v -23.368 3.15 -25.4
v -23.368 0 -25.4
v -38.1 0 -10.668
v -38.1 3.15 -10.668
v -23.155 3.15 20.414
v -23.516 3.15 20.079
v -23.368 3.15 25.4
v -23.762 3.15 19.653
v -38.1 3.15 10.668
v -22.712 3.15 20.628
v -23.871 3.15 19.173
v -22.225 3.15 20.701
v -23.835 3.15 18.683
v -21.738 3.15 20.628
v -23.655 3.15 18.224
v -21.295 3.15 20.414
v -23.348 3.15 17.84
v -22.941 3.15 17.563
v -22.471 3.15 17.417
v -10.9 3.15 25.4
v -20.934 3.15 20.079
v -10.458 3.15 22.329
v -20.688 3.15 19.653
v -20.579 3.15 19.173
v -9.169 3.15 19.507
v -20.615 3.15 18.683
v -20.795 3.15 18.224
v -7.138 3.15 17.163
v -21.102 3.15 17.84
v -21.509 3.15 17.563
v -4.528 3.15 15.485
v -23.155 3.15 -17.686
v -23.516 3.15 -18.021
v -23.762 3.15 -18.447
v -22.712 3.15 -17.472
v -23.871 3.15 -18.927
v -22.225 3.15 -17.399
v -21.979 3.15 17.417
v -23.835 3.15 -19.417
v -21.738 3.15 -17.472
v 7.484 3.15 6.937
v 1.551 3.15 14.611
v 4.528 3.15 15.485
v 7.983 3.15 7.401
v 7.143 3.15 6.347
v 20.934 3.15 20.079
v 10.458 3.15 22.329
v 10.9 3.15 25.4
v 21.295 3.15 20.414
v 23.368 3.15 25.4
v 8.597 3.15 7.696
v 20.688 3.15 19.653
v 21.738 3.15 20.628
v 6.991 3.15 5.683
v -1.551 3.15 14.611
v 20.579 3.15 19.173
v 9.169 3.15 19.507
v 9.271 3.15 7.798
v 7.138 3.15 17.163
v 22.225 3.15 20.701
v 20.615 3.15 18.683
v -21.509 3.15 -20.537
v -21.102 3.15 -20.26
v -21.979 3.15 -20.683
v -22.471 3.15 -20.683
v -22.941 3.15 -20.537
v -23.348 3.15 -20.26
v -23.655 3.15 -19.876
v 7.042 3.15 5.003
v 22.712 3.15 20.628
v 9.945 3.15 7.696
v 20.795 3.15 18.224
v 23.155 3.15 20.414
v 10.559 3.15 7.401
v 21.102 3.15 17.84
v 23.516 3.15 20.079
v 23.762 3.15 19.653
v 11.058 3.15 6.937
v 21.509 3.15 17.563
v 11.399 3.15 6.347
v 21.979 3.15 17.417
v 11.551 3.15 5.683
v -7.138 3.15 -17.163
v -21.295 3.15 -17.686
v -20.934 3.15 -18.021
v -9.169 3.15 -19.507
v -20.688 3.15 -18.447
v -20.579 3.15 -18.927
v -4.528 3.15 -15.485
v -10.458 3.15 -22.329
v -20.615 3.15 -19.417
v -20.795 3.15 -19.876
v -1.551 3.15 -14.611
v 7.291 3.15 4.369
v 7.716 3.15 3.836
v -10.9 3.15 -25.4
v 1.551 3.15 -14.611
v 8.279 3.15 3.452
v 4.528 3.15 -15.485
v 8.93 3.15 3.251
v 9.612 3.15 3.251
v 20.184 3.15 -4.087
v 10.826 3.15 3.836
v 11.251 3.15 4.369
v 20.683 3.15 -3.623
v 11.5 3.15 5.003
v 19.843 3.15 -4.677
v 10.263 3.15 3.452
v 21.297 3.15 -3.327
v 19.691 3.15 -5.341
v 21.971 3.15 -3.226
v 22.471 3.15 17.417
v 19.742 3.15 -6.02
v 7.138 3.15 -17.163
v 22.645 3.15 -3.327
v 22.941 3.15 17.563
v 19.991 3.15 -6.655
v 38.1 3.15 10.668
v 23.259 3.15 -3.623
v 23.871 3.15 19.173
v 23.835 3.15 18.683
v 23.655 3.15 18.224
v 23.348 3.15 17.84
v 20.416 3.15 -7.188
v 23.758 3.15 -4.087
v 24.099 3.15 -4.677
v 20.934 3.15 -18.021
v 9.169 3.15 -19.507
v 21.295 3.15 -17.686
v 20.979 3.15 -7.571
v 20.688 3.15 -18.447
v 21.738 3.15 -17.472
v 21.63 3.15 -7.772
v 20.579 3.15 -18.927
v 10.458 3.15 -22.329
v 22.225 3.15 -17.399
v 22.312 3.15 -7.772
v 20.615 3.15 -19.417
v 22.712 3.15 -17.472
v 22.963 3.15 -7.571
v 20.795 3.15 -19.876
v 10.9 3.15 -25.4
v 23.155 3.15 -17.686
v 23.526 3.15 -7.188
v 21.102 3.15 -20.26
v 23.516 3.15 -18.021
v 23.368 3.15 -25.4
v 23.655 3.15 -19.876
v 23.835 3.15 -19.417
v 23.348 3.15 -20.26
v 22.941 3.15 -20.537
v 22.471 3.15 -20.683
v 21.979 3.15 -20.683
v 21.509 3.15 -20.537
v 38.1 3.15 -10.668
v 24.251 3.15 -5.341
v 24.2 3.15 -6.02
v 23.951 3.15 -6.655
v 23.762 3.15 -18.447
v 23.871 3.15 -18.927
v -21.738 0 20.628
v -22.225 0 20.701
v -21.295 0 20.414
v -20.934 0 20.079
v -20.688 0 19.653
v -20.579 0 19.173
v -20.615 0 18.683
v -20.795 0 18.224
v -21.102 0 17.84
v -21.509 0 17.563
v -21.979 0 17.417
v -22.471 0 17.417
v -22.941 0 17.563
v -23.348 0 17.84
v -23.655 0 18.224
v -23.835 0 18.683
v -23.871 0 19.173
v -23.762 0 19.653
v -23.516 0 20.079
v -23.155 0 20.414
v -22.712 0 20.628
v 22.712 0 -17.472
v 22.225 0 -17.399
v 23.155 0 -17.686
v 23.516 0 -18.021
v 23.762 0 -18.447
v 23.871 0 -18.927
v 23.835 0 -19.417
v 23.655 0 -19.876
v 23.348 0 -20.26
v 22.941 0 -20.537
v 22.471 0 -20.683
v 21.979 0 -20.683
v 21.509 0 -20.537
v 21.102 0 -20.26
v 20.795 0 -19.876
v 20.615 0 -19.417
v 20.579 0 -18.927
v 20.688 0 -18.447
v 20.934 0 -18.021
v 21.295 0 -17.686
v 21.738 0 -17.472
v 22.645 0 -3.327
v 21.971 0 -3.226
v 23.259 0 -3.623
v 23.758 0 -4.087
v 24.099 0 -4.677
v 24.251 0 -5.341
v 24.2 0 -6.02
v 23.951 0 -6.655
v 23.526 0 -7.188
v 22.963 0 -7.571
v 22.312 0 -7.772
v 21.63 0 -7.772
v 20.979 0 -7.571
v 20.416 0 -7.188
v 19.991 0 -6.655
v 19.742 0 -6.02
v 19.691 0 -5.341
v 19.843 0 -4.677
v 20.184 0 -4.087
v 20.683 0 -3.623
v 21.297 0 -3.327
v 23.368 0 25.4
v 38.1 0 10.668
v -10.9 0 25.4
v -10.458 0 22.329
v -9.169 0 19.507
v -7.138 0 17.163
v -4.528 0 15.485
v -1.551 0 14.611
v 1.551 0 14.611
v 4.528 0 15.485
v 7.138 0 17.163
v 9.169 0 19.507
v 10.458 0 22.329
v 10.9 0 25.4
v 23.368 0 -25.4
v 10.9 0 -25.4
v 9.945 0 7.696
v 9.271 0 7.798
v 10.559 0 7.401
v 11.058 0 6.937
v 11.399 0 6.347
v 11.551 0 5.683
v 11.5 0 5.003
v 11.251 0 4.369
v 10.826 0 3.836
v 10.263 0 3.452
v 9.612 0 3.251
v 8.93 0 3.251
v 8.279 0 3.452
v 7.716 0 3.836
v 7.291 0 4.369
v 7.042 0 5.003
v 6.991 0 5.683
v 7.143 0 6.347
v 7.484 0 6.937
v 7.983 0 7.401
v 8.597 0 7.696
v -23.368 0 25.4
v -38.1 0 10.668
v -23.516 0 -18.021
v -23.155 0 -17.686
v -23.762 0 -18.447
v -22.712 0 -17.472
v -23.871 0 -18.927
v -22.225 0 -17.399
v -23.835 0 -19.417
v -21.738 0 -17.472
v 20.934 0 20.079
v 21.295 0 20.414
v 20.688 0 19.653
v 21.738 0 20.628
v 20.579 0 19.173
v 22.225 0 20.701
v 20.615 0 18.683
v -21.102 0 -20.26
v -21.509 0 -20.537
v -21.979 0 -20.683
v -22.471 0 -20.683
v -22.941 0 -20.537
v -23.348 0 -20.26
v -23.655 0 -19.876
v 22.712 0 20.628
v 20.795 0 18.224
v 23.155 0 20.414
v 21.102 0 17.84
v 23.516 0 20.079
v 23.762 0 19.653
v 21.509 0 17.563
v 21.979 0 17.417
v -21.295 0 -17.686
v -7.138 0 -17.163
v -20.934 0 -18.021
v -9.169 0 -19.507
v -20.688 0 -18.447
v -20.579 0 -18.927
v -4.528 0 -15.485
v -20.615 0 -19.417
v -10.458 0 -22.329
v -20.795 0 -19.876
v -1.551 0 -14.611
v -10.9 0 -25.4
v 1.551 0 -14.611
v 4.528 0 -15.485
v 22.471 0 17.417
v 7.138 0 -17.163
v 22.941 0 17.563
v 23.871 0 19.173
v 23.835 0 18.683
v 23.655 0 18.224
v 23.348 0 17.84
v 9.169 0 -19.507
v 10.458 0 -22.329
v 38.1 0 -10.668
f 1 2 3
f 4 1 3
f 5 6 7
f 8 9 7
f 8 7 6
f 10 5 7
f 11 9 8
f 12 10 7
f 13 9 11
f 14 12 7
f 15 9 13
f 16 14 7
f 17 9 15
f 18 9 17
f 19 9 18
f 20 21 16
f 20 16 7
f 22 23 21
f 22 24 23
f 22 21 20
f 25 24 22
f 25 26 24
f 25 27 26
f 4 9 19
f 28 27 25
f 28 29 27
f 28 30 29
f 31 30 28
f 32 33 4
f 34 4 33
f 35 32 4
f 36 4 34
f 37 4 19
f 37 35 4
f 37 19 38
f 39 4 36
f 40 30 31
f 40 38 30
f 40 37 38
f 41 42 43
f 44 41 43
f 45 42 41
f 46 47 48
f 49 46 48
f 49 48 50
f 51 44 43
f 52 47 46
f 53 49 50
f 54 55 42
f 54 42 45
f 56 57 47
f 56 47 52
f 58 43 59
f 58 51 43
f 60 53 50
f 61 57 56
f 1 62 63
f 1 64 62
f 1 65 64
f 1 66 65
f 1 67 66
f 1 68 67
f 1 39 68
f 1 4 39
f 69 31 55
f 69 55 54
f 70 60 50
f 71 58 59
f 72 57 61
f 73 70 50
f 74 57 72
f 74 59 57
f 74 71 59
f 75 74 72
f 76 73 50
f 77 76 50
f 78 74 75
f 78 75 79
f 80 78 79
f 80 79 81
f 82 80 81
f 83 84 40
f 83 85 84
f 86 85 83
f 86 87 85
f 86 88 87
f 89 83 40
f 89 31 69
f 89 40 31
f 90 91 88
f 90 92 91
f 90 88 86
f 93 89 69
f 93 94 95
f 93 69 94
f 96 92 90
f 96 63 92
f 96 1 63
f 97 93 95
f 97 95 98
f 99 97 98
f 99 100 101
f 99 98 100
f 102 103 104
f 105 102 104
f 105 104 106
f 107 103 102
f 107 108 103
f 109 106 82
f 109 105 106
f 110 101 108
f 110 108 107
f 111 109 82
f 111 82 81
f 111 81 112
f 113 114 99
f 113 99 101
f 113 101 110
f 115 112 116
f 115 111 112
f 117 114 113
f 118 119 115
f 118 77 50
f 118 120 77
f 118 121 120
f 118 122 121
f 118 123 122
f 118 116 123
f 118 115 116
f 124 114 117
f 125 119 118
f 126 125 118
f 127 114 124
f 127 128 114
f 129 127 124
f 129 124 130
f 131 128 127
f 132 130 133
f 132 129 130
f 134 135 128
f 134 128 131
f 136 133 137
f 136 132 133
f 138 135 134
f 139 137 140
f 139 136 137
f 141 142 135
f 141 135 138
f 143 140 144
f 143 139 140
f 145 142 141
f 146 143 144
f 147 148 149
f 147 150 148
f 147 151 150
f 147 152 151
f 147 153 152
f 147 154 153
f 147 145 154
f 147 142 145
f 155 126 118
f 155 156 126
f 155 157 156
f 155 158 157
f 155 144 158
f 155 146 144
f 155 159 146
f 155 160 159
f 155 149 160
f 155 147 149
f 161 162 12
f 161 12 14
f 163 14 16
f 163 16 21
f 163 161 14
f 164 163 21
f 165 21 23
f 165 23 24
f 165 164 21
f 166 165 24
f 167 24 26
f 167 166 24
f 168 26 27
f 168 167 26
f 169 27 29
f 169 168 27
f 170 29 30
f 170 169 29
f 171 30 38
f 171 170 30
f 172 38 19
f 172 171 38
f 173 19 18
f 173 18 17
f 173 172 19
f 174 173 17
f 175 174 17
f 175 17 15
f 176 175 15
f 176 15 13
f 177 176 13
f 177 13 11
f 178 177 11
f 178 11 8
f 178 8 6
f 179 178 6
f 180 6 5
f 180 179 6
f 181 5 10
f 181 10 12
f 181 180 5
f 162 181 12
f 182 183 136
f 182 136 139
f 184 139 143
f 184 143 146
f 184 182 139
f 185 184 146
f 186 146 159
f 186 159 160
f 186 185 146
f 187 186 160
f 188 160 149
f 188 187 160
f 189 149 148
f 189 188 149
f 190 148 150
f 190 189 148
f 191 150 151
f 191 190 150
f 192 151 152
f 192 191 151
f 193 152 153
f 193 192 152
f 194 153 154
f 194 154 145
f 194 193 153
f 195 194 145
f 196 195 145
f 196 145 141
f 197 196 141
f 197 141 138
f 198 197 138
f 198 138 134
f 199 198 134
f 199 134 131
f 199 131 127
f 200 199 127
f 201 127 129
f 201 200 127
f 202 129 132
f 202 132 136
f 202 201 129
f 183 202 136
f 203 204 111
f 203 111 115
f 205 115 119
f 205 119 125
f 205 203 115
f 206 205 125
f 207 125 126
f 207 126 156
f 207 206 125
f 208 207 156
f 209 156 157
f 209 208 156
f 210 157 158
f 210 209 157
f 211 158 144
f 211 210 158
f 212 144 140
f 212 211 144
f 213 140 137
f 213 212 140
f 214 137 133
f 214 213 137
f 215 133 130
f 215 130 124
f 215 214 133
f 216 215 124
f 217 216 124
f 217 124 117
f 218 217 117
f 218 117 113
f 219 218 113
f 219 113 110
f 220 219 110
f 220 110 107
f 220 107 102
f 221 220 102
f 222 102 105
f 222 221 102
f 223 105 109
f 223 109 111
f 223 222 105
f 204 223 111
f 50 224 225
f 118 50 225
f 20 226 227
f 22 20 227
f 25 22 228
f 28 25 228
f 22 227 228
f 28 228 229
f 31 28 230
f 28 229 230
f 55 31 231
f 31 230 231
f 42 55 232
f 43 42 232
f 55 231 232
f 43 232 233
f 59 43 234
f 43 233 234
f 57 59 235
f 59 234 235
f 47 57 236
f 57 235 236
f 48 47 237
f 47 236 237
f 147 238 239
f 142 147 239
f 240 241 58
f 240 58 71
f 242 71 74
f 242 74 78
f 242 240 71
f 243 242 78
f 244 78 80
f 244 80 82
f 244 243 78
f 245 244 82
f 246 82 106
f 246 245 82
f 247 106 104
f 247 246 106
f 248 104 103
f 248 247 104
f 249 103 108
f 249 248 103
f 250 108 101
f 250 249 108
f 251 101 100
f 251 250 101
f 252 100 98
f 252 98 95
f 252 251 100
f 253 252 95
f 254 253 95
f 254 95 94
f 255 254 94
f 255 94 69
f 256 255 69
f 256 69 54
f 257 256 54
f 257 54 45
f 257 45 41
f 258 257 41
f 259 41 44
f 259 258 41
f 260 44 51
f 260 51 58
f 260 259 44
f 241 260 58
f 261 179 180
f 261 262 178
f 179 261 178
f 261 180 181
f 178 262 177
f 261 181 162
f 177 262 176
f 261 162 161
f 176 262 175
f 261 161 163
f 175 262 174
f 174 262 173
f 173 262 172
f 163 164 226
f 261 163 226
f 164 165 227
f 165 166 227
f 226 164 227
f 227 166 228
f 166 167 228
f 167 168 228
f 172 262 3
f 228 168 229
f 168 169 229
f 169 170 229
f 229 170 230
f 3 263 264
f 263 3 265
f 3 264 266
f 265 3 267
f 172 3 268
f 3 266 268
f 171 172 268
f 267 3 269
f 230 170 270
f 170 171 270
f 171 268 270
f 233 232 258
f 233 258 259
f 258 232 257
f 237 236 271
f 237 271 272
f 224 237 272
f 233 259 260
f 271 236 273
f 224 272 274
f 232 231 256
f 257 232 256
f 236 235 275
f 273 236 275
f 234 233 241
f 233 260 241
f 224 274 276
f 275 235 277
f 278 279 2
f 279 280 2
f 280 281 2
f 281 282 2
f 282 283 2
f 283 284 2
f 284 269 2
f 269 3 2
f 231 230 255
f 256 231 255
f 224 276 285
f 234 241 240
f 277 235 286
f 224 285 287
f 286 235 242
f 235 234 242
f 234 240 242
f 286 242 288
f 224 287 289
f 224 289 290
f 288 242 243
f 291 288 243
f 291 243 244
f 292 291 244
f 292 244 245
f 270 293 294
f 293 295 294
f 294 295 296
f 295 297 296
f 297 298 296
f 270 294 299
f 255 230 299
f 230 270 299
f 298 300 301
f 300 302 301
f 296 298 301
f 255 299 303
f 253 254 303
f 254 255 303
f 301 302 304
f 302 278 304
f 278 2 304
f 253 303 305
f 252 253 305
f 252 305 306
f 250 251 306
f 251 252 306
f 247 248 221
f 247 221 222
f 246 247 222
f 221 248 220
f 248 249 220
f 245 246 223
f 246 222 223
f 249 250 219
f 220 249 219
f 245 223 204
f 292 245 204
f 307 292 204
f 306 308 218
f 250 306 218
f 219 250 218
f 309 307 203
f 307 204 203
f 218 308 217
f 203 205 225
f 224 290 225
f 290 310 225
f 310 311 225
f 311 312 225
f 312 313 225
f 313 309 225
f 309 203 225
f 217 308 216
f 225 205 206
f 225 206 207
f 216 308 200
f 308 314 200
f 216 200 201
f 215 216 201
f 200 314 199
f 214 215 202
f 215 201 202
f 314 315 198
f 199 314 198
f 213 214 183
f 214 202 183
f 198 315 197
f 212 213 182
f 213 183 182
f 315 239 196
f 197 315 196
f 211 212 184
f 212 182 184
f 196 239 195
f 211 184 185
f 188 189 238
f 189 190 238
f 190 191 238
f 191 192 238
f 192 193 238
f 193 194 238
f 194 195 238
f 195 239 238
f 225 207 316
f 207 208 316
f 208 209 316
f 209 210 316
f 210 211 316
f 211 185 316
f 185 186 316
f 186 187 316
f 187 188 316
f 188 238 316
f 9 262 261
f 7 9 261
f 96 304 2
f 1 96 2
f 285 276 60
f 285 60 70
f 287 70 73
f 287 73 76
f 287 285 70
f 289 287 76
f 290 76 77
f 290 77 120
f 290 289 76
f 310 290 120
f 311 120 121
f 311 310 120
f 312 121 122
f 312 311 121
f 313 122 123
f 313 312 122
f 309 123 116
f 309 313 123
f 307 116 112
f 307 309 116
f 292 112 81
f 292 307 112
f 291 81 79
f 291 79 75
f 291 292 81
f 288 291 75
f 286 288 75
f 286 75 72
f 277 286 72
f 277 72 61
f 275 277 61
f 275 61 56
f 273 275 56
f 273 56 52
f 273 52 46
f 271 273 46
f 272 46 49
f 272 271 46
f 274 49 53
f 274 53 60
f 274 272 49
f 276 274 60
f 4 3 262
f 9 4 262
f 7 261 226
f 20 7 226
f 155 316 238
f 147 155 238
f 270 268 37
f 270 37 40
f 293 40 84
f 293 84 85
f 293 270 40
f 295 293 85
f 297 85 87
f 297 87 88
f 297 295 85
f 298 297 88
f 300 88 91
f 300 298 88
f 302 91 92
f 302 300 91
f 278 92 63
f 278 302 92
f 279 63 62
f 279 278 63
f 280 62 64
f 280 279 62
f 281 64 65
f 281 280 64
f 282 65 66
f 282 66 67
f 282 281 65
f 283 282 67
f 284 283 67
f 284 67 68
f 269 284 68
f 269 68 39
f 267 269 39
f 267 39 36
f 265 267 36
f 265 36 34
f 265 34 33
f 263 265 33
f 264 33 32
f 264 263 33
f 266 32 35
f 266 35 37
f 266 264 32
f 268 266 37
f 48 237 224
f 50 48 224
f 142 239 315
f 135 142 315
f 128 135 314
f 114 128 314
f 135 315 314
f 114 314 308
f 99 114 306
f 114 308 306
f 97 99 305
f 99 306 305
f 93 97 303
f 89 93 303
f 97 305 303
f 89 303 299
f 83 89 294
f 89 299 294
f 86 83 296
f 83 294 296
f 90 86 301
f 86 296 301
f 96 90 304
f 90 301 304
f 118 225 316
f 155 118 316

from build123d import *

# Parameters (mm, degrees)
SKETCH1_R           = 1.651
SKETCH1_R_2         = 2.286
BOSS_EXTRUDE1_DEPTH = 3.1496


with BuildPart() as part:
    # Sketch1 → Boss-Extrude1 (new body)
    with BuildSketch(Plane(origin=(0, 0, 0), x_dir=(1, 0, 0), z_dir=(0, 1, 0))):
        with BuildLine():
            Line((23.368, -25.4), (38.1, -10.668))
            Line((38.1, -10.668), (38.1, 10.668))
            Line((38.1, 10.668), (23.368, 25.4))
            Line((23.368, 25.4), (10.899655632, 25.4))
            ThreePointArc((10.899655632, 25.4), (0, 14.500344368), (-10.899655632, 25.4))
            Line((-10.899655632, 25.4), (-23.368, 25.4))
            Line((-23.368, 25.4), (-38.1, 10.668))
            Line((-38.1, 10.668), (-38.1, -10.668))
            Line((-38.1, -10.668), (-23.368, -25.4))
            Line((-23.368, -25.4), (-10.899655632, -25.4))
            ThreePointArc((-10.899655632, -25.4), (0, -14.500344368), (10.899655632, -25.4))
            Line((10.899655632, -25.4), (23.368, -25.4))
        make_face()
        with Locations(Location((-22.225, 19.05, 0), (0, 0, 270))):
            Circle(SKETCH1_R, mode=Mode.SUBTRACT)
        with Locations(Location((22.225, 19.05, 0), (0, 0, 270))):
            Circle(SKETCH1_R, mode=Mode.SUBTRACT)
        with Locations(Location((22.225, -19.05, 0), (0, 0, 270))):
            Circle(SKETCH1_R, mode=Mode.SUBTRACT)
        with Locations(Location((-22.225, -19.05, 0), (0, 0, 270))):
            Circle(SKETCH1_R, mode=Mode.SUBTRACT)
        with Locations(Location((9.271, -5.5118, 0), (0, 0, 270))):
            Circle(SKETCH1_R_2, mode=Mode.SUBTRACT)
        with Locations(Location((21.971, 5.5118, 0), (0, 0, 270))):
            Circle(SKETCH1_R_2, mode=Mode.SUBTRACT)
    extrude(amount=BOSS_EXTRUDE1_DEPTH)


solid = part.part
